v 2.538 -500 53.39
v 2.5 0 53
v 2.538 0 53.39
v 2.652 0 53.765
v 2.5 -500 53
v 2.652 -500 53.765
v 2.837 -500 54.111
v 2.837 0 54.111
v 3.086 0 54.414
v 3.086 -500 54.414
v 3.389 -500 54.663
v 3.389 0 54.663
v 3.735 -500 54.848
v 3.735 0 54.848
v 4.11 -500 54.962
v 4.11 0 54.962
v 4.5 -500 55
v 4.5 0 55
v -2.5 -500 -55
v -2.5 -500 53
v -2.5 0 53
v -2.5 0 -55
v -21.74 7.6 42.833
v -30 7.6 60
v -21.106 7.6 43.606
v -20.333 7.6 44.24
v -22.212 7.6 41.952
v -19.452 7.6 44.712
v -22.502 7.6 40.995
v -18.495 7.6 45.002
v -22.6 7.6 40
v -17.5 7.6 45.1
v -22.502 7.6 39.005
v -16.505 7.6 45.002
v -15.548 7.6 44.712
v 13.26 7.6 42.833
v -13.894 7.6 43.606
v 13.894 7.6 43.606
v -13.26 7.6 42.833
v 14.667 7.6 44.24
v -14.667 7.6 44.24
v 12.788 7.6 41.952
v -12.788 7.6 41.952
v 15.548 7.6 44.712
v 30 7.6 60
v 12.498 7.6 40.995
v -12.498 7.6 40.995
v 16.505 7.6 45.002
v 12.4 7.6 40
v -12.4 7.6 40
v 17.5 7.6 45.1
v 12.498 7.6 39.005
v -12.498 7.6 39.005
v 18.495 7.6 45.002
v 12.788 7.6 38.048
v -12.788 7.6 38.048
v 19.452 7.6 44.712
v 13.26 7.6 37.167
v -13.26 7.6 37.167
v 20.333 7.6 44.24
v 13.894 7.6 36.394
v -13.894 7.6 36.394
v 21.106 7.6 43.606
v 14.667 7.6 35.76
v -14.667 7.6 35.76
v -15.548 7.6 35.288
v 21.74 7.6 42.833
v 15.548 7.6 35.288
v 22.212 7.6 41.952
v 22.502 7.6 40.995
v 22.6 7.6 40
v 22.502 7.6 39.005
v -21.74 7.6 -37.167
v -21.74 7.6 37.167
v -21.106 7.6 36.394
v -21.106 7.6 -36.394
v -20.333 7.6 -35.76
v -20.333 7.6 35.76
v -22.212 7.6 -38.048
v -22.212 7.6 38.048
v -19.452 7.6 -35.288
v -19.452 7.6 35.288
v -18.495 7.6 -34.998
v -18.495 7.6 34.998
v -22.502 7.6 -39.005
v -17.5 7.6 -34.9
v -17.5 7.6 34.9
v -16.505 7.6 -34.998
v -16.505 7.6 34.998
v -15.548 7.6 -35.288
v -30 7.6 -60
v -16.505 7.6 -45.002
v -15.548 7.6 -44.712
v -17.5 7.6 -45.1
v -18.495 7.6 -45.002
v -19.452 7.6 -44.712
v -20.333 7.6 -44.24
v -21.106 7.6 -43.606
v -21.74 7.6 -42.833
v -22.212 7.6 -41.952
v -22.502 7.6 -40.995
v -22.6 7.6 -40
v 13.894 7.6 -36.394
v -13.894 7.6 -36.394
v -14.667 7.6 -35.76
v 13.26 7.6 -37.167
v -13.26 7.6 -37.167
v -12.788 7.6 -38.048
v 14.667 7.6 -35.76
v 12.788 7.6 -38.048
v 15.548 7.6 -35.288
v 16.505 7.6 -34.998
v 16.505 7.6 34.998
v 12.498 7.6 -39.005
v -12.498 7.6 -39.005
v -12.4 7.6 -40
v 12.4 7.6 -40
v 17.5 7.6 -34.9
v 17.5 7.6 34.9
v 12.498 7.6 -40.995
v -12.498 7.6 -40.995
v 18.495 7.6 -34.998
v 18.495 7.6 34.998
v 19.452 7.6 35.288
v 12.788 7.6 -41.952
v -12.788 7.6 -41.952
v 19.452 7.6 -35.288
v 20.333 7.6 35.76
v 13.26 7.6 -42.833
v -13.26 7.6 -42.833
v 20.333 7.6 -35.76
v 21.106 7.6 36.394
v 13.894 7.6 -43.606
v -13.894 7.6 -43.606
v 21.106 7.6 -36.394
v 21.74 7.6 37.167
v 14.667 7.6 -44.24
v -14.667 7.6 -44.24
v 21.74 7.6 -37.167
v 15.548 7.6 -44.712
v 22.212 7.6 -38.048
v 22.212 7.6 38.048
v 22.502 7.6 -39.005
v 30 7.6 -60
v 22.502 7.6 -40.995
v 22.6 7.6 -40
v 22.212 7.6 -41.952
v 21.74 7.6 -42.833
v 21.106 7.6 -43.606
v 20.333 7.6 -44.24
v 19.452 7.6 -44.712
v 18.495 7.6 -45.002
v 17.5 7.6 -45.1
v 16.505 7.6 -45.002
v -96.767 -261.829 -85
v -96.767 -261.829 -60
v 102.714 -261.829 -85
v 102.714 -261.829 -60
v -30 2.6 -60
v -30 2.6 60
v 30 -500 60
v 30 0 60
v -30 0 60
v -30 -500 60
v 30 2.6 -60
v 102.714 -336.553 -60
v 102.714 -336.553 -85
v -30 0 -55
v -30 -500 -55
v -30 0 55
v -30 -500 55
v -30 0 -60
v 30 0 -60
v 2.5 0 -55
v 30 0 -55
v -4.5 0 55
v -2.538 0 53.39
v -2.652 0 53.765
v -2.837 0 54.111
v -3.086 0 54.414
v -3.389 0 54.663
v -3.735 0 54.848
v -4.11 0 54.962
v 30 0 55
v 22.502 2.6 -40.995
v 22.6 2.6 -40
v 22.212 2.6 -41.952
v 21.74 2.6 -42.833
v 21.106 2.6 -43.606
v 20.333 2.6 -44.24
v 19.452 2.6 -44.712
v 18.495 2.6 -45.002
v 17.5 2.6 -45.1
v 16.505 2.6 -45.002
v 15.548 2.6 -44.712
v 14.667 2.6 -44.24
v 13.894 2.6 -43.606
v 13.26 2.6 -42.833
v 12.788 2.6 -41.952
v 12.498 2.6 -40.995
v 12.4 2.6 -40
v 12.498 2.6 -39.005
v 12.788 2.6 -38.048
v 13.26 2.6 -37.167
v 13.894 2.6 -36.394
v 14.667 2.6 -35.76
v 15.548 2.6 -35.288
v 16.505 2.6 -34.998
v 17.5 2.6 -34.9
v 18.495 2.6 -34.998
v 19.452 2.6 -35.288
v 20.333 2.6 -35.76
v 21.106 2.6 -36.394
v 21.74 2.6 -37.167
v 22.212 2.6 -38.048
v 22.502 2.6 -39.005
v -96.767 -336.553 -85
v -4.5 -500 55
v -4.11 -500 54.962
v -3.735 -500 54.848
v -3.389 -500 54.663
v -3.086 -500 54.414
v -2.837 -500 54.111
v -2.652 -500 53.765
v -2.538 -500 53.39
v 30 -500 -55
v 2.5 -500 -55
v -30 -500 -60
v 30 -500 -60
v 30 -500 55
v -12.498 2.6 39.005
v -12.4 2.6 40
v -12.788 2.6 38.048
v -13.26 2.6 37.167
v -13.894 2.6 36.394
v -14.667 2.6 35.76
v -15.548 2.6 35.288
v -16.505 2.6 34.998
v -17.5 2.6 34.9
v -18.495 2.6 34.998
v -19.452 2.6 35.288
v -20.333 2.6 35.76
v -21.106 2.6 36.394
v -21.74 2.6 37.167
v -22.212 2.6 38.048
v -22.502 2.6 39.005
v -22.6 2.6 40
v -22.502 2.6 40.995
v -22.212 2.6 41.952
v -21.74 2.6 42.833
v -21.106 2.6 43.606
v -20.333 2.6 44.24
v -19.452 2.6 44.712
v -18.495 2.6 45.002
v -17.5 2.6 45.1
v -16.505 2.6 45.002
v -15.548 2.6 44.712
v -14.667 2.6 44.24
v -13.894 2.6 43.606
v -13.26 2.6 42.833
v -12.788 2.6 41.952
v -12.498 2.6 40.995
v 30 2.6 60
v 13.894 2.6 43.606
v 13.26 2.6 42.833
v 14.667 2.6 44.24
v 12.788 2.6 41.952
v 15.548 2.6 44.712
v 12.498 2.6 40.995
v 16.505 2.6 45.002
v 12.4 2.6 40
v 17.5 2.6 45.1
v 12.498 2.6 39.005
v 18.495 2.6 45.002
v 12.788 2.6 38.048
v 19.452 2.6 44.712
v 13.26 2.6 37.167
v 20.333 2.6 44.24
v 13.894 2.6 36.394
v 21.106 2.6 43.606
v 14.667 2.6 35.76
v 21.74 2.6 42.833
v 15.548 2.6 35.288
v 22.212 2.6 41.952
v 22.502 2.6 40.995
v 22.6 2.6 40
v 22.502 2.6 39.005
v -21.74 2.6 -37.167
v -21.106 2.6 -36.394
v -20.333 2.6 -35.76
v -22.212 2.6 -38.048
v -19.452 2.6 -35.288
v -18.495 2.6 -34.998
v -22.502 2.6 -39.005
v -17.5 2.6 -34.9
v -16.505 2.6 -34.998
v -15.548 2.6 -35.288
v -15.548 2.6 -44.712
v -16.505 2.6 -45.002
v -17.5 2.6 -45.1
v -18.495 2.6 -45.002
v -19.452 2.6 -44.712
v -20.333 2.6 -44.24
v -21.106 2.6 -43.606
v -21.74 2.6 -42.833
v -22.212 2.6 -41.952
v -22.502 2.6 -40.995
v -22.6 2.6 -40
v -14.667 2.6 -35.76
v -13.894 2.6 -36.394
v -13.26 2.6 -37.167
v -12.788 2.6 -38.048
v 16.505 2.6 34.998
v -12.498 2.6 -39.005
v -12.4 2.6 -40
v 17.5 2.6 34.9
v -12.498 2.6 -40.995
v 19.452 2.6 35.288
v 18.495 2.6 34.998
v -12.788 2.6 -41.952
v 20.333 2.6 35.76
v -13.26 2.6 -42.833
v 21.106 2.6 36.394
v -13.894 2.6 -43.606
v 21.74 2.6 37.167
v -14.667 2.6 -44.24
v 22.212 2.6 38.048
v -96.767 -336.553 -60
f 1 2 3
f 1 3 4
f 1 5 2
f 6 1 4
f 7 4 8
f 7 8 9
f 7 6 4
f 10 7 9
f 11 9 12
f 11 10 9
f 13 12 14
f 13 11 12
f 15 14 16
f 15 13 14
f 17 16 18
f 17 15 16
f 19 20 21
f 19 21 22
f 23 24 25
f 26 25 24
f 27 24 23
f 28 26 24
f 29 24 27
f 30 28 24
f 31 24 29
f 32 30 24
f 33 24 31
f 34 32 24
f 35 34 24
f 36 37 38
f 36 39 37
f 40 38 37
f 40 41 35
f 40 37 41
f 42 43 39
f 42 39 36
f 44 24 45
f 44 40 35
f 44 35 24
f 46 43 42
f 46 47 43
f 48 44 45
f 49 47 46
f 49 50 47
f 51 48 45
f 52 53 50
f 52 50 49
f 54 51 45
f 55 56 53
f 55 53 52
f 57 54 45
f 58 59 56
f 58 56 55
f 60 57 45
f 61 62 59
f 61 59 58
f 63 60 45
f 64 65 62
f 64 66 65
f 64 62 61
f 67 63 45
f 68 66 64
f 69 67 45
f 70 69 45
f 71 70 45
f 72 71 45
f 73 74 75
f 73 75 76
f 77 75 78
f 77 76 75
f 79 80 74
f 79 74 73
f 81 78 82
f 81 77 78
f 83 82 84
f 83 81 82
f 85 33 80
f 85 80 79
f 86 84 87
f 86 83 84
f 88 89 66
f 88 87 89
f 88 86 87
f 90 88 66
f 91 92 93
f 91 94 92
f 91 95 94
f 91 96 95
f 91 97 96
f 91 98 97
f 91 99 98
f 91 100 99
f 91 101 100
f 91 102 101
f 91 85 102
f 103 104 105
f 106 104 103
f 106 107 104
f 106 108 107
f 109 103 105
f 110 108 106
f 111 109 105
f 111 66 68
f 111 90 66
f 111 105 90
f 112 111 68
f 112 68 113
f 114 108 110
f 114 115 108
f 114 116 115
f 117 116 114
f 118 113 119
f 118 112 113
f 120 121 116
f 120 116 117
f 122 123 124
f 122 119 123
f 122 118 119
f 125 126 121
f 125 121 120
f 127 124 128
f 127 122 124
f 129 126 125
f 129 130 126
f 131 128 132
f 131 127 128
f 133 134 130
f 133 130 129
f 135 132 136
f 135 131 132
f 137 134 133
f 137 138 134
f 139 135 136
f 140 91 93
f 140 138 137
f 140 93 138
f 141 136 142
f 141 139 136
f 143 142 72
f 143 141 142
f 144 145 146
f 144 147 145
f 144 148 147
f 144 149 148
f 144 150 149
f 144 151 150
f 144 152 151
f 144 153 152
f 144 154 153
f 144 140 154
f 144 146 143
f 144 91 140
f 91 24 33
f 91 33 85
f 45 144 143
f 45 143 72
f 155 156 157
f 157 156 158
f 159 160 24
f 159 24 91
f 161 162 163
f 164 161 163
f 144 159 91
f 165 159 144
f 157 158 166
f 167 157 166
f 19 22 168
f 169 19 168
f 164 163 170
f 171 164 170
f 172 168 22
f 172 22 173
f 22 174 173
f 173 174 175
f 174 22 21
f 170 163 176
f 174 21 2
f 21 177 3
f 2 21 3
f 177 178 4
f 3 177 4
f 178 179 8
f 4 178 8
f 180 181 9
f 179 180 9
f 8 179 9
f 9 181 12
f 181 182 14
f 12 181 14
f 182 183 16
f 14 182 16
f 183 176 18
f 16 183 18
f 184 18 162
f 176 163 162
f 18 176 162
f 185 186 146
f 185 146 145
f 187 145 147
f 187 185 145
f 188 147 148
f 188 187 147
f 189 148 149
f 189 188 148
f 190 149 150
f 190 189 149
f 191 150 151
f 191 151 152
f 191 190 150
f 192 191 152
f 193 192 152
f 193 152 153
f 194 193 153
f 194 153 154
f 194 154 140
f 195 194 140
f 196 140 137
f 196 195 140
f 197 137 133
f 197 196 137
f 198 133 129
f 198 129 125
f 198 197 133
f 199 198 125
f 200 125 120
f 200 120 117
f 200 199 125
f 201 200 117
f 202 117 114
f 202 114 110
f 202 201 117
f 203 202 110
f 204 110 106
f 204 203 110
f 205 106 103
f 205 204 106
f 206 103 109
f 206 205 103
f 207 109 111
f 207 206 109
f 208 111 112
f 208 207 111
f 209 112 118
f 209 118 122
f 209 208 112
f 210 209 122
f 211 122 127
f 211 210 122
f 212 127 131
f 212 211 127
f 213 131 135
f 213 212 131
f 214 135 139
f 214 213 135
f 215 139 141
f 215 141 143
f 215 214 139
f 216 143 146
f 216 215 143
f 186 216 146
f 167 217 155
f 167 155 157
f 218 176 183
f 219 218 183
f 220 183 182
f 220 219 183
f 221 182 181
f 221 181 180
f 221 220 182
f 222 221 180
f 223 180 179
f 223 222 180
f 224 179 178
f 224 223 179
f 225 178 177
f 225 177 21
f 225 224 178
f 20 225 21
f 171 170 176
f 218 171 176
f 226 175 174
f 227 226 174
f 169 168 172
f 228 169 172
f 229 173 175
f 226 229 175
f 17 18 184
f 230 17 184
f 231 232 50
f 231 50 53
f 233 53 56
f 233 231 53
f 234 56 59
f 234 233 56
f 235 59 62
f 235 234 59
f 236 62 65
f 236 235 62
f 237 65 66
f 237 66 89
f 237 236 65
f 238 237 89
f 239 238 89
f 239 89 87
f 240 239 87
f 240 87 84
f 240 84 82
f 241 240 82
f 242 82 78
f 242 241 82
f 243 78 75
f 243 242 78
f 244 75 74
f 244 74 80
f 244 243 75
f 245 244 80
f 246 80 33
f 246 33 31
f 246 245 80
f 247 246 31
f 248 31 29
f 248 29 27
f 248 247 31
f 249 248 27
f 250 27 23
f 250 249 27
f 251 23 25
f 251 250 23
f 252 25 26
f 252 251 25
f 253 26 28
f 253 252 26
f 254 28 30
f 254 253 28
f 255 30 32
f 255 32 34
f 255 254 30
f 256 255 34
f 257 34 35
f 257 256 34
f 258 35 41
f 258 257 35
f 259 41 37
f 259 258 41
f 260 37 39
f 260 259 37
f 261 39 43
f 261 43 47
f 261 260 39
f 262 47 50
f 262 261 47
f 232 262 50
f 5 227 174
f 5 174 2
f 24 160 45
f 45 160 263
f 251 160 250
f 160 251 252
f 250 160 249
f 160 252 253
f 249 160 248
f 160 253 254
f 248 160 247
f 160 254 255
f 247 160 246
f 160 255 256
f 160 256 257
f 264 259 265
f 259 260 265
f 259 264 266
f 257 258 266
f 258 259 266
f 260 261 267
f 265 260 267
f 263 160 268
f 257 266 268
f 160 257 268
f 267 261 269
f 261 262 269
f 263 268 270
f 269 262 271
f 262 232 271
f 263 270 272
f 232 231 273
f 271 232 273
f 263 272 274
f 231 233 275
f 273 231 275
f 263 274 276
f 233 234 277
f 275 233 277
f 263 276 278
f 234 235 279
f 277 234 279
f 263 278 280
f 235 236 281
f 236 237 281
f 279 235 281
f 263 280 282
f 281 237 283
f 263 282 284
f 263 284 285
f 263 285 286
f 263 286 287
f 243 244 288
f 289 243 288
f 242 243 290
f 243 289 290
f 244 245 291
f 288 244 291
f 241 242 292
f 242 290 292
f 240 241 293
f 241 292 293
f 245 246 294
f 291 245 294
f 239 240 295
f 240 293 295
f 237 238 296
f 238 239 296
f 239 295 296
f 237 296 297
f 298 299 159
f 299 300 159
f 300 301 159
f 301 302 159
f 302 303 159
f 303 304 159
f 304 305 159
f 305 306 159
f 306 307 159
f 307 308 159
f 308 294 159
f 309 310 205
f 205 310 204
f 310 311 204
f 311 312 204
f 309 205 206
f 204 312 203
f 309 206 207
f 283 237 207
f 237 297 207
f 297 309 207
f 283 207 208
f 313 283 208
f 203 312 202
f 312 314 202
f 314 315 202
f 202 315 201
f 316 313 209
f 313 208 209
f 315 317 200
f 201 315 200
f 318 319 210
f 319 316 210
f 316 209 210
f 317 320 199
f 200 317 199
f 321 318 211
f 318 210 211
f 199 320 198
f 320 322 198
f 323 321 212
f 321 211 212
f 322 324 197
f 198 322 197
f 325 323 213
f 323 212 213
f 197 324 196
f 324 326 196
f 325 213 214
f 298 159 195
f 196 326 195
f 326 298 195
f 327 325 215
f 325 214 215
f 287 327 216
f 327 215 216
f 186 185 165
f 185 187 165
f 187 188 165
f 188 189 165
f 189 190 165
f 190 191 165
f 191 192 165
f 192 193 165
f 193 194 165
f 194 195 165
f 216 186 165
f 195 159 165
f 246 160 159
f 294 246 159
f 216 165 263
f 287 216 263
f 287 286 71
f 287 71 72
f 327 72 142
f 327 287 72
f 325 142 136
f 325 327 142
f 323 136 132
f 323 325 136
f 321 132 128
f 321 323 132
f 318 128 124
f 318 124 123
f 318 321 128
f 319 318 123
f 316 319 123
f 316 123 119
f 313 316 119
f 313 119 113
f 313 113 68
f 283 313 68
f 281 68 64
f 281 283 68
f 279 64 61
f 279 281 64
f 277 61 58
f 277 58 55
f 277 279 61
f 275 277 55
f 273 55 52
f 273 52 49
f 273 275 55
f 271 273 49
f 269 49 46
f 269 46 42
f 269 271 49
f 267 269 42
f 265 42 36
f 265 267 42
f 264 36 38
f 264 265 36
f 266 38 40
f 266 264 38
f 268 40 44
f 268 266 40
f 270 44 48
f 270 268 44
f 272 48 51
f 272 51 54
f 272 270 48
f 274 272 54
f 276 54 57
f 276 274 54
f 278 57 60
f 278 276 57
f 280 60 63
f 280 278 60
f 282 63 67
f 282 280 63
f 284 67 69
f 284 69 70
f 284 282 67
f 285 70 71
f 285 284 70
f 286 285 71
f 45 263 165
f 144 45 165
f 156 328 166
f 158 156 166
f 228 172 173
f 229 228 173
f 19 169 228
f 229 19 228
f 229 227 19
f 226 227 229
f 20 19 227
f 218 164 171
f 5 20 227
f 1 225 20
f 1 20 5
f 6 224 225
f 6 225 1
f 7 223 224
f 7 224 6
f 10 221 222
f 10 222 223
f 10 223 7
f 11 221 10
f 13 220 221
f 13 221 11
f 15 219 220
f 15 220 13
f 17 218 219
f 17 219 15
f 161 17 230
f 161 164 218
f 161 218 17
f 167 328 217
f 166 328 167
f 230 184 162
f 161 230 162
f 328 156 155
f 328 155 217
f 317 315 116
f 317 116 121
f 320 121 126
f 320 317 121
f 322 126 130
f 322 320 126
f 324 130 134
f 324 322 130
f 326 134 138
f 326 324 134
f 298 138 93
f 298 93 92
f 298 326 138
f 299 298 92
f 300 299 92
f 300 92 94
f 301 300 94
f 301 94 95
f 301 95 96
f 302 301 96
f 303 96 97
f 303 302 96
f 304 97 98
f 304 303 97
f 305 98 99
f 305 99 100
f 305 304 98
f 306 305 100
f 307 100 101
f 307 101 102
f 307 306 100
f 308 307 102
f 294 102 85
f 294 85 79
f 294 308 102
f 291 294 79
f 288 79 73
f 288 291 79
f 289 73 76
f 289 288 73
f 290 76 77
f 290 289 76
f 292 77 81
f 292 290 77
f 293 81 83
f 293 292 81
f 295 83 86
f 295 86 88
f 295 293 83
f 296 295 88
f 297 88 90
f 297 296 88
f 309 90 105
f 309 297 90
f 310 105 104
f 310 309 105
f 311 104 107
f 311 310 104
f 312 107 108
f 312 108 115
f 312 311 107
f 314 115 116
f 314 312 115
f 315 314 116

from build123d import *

# Parameters (mm, degrees)
F1_DEPTH = 500
F3_W     = 60
F3_H     = 120
F3_R     = 5.1
F4_DEPTH = 5
F5_R     = 2
F6_R     = 2
F7_W     = 199.480854
F7_H     = 74.723839
F8_DEPTH = 25


with BuildPart() as f1:
    # F0 (on Front) → F1 (new body)
    with BuildSketch(Plane.XZ):
        Polygon((-30, 55), (-2.5, 55), (-2.5, -55), (-30, -55), (-30, -60), (30, -60), (30, -55), (2.5, -55), (2.5, 55), (30, 55), (30, 60), (-30, 60), align=None)
    extrude(amount=F1_DEPTH)

    # F5
    f5_edges = [f1.edges().sort_by_distance(p)[0] for p in [
        (2.5, -250, 55),
    ]]
    fillet(f5_edges, radius=F5_R)

    # F6
    f6_edges = [f1.edges().sort_by_distance(p)[0] for p in [
        (-2.5, -250, 55),
    ]]
    fillet(f6_edges, radius=F6_R)


with BuildPart() as f4:
    # F3 (on offset) → F4 (new body)
    with BuildSketch(Plane(origin=(0, 2.6, 0), x_dir=(1, 0, 0), z_dir=(0, 1, 0))):
        Rectangle(F3_W, F3_H)
        with Locations((-17.5, -40)):
            Circle(F3_R, mode=Mode.SUBTRACT)
        with Locations((17.5, -40)):
            Circle(F3_R, mode=Mode.SUBTRACT)
        with Locations((-17.5, 40)):
            Circle(F3_R, mode=Mode.SUBTRACT)
        with Locations((17.5, 40)):
            Circle(F3_R, mode=Mode.SUBTRACT)
    extrude(amount=F4_DEPTH)


with BuildPart() as f8:
    # F7 (on face) → F8 (new body)
    with BuildSketch(Plane(origin=(0, 0, -60), x_dir=(1, 0, 0), z_dir=(0, 0, -1))):
        with Locations((2.973612, 299.19064)):
            Rectangle(F7_W, F7_H)
    extrude(amount=F8_DEPTH)


solid = Compound([f1.part, f4.part, f8.part])
